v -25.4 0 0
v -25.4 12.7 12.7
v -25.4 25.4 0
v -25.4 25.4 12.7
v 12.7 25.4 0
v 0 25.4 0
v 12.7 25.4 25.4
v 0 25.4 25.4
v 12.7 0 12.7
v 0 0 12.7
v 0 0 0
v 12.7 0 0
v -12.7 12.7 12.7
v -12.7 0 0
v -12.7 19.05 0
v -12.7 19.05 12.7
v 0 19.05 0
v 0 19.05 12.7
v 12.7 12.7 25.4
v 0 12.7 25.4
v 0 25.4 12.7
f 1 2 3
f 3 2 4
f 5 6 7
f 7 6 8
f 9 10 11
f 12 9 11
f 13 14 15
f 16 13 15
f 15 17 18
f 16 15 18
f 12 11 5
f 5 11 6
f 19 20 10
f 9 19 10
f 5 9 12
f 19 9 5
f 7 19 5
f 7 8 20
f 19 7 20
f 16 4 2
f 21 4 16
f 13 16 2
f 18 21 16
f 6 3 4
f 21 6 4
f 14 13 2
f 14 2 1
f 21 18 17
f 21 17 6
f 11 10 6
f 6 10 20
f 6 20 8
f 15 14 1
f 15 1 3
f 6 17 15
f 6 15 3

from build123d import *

# Parameters (mm, degrees)
F1_DEPTH = 12.7
F3_DEPTH = 25.4
F5_DEPTH = 12.7


with BuildPart() as f1:
    # F0 (on Right) → F1 (new body)
    with BuildSketch(Plane.YZ):
        Polygon((0, 12.7), (0, 0), (25.4, 0), (25.4, 25.4), (12.7, 25.4), align=None)
    extrude(amount=F1_DEPTH)


with BuildPart() as f3:
    # F2 (on Right) → F3 (new body)
    with BuildSketch(Plane.YZ):
        Polygon((12.7, 12.7), (0, 0), (25.4, 0), (25.4, 12.7), align=None)
    extrude(amount=-F3_DEPTH)

    # F4 (on Right) → F5 (cut)
    with BuildSketch(Plane.YZ):
        Polygon((12.7, 12.7), (0, 0), (19.05, 0), (19.05, 12.7), align=None)
    extrude(amount=-F5_DEPTH, mode=Mode.SUBTRACT)


solid = Compound([f1.part, f3.part])
